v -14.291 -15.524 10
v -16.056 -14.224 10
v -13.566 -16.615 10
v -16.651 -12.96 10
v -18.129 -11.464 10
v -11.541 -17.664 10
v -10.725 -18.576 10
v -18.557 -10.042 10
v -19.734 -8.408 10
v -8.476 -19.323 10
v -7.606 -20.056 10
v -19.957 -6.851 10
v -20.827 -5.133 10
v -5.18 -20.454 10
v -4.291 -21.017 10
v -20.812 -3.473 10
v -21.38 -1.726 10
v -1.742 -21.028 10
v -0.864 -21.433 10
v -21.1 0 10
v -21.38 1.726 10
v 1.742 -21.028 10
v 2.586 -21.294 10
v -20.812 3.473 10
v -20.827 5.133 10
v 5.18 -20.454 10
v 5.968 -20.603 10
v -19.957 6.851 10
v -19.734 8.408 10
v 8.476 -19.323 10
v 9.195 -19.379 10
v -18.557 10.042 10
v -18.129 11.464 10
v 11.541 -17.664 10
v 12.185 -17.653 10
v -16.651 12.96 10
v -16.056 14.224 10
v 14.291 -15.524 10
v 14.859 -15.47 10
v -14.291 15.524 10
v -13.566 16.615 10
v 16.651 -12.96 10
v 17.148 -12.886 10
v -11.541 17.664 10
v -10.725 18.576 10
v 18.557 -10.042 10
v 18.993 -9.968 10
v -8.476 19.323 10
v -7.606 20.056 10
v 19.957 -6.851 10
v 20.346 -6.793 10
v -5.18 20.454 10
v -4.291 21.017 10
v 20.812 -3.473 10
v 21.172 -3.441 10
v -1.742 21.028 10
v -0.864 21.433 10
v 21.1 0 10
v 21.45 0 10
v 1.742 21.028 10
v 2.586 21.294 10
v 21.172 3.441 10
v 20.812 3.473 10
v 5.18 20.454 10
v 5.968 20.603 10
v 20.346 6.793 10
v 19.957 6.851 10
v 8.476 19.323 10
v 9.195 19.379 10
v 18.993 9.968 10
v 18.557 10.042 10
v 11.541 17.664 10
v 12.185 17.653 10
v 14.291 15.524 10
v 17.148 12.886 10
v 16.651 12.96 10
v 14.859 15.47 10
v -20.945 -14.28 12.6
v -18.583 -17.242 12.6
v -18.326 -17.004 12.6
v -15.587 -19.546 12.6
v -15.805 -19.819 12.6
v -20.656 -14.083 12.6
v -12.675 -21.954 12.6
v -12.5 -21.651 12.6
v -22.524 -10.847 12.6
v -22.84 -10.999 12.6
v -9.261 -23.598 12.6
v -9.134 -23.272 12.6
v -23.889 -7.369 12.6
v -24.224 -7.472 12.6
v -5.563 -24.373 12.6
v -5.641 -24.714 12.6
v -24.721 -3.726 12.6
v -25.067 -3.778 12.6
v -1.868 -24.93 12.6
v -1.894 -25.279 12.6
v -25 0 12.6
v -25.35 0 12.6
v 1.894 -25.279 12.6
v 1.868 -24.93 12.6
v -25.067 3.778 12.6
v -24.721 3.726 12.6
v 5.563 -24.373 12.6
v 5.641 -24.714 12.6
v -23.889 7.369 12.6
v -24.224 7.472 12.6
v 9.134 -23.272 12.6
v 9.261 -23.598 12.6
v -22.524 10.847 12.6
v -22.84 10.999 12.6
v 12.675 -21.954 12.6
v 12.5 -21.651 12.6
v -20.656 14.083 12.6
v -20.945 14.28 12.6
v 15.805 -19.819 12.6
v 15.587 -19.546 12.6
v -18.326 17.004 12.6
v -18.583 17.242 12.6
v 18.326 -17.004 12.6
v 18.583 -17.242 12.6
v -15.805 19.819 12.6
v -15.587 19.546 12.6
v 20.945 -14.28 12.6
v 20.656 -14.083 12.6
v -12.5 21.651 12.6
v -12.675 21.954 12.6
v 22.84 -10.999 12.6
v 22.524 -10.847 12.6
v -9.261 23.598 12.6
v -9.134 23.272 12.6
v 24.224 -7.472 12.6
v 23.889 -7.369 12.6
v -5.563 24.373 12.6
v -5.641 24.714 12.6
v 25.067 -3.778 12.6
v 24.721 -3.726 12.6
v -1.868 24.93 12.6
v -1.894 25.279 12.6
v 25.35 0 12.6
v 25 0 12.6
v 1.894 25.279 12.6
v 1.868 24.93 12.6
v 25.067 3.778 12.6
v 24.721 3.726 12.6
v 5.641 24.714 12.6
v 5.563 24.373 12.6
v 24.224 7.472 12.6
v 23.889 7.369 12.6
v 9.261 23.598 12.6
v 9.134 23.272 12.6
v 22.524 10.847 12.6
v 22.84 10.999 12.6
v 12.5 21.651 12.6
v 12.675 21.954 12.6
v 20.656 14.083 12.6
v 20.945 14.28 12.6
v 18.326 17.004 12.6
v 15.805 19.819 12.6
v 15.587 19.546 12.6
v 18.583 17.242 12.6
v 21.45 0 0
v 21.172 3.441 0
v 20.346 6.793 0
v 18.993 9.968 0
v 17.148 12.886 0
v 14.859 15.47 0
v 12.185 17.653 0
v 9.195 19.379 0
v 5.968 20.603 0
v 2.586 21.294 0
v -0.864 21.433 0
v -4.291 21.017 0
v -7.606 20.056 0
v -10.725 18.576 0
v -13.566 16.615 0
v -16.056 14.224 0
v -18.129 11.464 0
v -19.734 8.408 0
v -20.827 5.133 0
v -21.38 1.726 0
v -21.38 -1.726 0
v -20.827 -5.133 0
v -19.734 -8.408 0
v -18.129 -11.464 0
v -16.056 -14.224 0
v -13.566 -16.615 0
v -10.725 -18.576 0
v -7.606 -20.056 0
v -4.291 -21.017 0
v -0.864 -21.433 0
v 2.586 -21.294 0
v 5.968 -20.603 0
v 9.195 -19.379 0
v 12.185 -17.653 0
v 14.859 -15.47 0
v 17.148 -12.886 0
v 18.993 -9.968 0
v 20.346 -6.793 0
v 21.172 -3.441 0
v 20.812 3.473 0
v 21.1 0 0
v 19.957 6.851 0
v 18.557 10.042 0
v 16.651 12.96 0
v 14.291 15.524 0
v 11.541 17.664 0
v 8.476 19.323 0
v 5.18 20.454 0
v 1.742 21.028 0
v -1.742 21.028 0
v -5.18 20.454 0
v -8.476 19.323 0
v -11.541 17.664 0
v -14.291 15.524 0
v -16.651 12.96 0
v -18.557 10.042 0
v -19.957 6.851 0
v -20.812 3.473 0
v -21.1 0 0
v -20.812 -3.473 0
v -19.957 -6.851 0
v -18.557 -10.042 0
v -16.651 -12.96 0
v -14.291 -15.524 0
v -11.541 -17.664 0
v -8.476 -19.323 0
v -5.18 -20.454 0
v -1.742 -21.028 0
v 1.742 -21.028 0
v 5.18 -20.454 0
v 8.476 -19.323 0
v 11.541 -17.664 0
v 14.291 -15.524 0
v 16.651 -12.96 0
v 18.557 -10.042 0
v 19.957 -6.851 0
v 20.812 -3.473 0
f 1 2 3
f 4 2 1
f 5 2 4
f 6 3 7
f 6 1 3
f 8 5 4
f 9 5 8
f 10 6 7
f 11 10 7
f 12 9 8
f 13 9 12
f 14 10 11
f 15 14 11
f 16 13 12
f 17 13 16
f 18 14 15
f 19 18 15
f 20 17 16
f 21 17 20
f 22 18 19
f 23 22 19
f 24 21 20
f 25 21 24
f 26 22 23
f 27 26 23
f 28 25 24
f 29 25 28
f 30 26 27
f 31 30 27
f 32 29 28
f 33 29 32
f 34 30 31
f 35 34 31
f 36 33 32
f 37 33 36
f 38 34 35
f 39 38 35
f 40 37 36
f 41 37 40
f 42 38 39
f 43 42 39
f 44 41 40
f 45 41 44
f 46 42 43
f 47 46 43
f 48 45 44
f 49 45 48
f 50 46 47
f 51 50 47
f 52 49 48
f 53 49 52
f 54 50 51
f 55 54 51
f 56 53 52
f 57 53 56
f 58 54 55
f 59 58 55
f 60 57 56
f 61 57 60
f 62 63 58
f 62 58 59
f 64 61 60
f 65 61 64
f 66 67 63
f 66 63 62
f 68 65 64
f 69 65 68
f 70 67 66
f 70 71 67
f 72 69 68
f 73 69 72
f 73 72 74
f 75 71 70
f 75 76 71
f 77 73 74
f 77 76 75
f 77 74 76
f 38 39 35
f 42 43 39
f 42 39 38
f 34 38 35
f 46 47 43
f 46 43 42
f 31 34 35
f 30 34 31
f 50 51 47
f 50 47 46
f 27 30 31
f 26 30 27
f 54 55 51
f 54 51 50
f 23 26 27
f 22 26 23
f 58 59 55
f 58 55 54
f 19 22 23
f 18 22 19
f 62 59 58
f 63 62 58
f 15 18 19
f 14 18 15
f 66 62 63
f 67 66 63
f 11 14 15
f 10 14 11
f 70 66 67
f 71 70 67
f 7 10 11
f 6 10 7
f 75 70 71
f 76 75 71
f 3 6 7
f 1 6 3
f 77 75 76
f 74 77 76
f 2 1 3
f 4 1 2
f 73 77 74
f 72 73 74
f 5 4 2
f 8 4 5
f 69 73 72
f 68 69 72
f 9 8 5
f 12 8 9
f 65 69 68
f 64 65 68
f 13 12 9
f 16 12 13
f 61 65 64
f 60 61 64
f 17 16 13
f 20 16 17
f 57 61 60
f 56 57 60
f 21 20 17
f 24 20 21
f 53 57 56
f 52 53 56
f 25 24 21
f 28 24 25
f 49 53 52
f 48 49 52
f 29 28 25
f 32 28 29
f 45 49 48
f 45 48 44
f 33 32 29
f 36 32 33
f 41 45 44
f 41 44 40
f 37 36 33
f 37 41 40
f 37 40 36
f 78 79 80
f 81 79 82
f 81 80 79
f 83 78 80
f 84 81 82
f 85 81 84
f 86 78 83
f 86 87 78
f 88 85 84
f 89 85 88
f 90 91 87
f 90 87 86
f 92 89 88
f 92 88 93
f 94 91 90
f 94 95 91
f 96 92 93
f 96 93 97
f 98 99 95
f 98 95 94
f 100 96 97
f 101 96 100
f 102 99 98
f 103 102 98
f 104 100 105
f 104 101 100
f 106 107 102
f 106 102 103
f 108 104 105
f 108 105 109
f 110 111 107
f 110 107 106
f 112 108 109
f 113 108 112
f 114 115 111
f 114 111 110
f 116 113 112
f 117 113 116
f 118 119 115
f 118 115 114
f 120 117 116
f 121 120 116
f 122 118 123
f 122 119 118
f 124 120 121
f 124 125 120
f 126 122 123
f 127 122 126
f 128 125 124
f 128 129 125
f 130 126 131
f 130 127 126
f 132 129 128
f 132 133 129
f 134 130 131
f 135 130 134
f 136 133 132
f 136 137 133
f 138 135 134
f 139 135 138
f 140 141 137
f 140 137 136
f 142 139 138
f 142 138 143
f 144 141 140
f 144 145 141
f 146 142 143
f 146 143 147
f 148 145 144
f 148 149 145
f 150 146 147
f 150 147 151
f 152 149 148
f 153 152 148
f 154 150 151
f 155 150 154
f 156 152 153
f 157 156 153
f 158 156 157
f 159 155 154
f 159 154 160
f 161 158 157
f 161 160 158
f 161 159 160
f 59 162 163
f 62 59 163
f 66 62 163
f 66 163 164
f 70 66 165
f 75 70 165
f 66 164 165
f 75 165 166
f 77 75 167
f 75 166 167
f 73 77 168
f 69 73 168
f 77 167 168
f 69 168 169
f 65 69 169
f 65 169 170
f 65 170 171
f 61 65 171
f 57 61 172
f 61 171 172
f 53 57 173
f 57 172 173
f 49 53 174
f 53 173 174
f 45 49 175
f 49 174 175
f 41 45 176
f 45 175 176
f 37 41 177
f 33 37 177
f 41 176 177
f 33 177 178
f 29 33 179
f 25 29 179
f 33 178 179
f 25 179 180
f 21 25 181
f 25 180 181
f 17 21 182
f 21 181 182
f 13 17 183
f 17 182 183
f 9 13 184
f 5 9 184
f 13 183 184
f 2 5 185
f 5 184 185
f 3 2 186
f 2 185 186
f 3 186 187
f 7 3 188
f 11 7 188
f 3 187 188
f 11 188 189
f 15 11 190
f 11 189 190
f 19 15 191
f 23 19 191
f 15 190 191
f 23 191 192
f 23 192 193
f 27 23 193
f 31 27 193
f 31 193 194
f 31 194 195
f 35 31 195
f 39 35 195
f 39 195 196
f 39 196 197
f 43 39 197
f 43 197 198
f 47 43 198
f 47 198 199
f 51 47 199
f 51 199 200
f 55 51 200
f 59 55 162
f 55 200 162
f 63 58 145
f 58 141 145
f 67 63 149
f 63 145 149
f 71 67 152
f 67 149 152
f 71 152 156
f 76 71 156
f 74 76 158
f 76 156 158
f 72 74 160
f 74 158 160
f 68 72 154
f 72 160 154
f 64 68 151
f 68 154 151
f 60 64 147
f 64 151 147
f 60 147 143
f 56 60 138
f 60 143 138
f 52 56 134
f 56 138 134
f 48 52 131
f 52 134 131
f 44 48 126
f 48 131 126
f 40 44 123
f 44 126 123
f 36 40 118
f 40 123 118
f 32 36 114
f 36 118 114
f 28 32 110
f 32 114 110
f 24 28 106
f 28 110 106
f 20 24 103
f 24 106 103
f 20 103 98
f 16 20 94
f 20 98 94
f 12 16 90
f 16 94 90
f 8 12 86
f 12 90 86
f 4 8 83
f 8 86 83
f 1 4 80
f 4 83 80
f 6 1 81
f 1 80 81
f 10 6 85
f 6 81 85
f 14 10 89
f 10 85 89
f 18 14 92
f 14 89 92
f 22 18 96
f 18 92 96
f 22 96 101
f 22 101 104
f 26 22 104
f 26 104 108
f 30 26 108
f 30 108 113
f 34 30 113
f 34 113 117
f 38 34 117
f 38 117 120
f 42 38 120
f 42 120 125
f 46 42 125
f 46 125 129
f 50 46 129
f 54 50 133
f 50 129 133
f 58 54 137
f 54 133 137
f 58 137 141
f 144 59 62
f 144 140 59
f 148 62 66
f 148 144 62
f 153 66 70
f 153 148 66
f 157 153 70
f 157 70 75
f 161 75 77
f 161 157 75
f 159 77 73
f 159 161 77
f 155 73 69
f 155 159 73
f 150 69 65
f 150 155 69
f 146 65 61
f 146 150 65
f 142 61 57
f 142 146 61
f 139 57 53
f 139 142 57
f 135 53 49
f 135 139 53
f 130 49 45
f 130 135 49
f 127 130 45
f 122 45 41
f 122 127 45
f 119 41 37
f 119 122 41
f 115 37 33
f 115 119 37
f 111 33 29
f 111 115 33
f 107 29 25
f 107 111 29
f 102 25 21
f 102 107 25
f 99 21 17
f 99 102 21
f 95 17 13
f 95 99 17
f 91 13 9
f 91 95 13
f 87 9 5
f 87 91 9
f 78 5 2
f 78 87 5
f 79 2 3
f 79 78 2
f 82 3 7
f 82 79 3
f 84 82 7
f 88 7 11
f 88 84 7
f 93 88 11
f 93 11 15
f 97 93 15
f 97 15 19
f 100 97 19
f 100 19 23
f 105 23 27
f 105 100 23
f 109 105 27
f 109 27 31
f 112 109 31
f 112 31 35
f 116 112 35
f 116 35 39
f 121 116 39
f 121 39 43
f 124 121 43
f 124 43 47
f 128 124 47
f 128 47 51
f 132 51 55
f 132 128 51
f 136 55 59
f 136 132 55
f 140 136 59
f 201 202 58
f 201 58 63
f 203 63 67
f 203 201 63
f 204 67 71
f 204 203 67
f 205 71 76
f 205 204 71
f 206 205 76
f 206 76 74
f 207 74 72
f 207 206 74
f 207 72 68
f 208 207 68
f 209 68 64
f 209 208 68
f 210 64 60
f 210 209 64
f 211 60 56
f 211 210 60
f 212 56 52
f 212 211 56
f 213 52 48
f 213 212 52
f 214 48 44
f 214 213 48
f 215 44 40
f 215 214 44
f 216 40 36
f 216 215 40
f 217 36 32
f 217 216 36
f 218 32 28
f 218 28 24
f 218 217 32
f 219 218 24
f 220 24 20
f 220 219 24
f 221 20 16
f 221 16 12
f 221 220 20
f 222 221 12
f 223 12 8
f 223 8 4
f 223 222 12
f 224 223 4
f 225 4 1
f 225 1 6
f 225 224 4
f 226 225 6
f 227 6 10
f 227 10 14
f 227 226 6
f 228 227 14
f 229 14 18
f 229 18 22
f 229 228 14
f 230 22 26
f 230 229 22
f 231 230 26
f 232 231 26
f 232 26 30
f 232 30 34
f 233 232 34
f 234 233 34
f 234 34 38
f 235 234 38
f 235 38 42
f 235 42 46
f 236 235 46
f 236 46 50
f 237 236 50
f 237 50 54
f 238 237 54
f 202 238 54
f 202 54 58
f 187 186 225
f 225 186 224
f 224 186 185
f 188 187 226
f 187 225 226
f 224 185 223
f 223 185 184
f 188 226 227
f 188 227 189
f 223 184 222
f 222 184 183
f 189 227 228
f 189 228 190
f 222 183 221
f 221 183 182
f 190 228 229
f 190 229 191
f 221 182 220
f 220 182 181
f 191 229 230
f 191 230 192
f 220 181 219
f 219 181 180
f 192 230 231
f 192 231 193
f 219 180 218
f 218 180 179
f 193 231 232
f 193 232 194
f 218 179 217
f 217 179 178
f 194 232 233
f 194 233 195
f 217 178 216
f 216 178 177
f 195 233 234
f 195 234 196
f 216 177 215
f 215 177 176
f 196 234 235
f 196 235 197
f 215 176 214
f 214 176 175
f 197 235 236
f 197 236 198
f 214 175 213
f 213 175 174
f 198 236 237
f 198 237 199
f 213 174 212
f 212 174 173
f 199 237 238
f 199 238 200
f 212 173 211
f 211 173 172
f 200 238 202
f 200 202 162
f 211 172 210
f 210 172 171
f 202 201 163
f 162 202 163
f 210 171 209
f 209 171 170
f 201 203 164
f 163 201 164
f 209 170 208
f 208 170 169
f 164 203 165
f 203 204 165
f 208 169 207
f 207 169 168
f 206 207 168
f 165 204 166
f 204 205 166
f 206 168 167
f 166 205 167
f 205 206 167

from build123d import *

# Parameters (mm, degrees)
CYLINDER001_R     = 21.1
CYLINDER001_DEPTH = 10
CYLINDER_R        = 21.45
CYLINDER_DEPTH    = 10


with BuildPart() as cylinder001:
    # Cylinder001 → Cylinder001 (new body)
    with BuildSketch(Plane.XY):
        Circle(CYLINDER001_R)
    extrude(amount=CYLINDER001_DEPTH)


with BuildPart() as cut:
    # Cylinder → Cylinder (new body)
    with BuildSketch(Plane.XY):
        Circle(CYLINDER_R)
    extrude(amount=CYLINDER_DEPTH)

    # Cut: cut Cylinder001
    add(cylinder001.part, mode=Mode.SUBTRACT)


with BuildPart() as cone001:
    # Cone001 → Cone001 (revolve)
    with BuildSketch(Plane(origin=(0, 0, 10), x_dir=(1, 0, 0), z_dir=(0, -1, 0))):
        Polygon((0, 0), (21.1, 0), (25, 2.6), (0, 2.6), align=None)
    revolve(axis=Axis((0, 0, 10), (0, 0, 1)))


with BuildPart() as cut001:
    # Cone → Cone (revolve)
    with BuildSketch(Plane(origin=(0, 0, 10), x_dir=(1, 0, 0), z_dir=(0, -1, 0))):
        Polygon((0, 0), (21.45, 0), (25.35, 2.6), (0, 2.6), align=None)
    revolve(axis=Axis((0, 0, 10), (0, 0, 1)))

    # Cut001: cut Cone001
    add(cone001.part, mode=Mode.SUBTRACT)


solid = Compound([cut.part, cut001.part])
